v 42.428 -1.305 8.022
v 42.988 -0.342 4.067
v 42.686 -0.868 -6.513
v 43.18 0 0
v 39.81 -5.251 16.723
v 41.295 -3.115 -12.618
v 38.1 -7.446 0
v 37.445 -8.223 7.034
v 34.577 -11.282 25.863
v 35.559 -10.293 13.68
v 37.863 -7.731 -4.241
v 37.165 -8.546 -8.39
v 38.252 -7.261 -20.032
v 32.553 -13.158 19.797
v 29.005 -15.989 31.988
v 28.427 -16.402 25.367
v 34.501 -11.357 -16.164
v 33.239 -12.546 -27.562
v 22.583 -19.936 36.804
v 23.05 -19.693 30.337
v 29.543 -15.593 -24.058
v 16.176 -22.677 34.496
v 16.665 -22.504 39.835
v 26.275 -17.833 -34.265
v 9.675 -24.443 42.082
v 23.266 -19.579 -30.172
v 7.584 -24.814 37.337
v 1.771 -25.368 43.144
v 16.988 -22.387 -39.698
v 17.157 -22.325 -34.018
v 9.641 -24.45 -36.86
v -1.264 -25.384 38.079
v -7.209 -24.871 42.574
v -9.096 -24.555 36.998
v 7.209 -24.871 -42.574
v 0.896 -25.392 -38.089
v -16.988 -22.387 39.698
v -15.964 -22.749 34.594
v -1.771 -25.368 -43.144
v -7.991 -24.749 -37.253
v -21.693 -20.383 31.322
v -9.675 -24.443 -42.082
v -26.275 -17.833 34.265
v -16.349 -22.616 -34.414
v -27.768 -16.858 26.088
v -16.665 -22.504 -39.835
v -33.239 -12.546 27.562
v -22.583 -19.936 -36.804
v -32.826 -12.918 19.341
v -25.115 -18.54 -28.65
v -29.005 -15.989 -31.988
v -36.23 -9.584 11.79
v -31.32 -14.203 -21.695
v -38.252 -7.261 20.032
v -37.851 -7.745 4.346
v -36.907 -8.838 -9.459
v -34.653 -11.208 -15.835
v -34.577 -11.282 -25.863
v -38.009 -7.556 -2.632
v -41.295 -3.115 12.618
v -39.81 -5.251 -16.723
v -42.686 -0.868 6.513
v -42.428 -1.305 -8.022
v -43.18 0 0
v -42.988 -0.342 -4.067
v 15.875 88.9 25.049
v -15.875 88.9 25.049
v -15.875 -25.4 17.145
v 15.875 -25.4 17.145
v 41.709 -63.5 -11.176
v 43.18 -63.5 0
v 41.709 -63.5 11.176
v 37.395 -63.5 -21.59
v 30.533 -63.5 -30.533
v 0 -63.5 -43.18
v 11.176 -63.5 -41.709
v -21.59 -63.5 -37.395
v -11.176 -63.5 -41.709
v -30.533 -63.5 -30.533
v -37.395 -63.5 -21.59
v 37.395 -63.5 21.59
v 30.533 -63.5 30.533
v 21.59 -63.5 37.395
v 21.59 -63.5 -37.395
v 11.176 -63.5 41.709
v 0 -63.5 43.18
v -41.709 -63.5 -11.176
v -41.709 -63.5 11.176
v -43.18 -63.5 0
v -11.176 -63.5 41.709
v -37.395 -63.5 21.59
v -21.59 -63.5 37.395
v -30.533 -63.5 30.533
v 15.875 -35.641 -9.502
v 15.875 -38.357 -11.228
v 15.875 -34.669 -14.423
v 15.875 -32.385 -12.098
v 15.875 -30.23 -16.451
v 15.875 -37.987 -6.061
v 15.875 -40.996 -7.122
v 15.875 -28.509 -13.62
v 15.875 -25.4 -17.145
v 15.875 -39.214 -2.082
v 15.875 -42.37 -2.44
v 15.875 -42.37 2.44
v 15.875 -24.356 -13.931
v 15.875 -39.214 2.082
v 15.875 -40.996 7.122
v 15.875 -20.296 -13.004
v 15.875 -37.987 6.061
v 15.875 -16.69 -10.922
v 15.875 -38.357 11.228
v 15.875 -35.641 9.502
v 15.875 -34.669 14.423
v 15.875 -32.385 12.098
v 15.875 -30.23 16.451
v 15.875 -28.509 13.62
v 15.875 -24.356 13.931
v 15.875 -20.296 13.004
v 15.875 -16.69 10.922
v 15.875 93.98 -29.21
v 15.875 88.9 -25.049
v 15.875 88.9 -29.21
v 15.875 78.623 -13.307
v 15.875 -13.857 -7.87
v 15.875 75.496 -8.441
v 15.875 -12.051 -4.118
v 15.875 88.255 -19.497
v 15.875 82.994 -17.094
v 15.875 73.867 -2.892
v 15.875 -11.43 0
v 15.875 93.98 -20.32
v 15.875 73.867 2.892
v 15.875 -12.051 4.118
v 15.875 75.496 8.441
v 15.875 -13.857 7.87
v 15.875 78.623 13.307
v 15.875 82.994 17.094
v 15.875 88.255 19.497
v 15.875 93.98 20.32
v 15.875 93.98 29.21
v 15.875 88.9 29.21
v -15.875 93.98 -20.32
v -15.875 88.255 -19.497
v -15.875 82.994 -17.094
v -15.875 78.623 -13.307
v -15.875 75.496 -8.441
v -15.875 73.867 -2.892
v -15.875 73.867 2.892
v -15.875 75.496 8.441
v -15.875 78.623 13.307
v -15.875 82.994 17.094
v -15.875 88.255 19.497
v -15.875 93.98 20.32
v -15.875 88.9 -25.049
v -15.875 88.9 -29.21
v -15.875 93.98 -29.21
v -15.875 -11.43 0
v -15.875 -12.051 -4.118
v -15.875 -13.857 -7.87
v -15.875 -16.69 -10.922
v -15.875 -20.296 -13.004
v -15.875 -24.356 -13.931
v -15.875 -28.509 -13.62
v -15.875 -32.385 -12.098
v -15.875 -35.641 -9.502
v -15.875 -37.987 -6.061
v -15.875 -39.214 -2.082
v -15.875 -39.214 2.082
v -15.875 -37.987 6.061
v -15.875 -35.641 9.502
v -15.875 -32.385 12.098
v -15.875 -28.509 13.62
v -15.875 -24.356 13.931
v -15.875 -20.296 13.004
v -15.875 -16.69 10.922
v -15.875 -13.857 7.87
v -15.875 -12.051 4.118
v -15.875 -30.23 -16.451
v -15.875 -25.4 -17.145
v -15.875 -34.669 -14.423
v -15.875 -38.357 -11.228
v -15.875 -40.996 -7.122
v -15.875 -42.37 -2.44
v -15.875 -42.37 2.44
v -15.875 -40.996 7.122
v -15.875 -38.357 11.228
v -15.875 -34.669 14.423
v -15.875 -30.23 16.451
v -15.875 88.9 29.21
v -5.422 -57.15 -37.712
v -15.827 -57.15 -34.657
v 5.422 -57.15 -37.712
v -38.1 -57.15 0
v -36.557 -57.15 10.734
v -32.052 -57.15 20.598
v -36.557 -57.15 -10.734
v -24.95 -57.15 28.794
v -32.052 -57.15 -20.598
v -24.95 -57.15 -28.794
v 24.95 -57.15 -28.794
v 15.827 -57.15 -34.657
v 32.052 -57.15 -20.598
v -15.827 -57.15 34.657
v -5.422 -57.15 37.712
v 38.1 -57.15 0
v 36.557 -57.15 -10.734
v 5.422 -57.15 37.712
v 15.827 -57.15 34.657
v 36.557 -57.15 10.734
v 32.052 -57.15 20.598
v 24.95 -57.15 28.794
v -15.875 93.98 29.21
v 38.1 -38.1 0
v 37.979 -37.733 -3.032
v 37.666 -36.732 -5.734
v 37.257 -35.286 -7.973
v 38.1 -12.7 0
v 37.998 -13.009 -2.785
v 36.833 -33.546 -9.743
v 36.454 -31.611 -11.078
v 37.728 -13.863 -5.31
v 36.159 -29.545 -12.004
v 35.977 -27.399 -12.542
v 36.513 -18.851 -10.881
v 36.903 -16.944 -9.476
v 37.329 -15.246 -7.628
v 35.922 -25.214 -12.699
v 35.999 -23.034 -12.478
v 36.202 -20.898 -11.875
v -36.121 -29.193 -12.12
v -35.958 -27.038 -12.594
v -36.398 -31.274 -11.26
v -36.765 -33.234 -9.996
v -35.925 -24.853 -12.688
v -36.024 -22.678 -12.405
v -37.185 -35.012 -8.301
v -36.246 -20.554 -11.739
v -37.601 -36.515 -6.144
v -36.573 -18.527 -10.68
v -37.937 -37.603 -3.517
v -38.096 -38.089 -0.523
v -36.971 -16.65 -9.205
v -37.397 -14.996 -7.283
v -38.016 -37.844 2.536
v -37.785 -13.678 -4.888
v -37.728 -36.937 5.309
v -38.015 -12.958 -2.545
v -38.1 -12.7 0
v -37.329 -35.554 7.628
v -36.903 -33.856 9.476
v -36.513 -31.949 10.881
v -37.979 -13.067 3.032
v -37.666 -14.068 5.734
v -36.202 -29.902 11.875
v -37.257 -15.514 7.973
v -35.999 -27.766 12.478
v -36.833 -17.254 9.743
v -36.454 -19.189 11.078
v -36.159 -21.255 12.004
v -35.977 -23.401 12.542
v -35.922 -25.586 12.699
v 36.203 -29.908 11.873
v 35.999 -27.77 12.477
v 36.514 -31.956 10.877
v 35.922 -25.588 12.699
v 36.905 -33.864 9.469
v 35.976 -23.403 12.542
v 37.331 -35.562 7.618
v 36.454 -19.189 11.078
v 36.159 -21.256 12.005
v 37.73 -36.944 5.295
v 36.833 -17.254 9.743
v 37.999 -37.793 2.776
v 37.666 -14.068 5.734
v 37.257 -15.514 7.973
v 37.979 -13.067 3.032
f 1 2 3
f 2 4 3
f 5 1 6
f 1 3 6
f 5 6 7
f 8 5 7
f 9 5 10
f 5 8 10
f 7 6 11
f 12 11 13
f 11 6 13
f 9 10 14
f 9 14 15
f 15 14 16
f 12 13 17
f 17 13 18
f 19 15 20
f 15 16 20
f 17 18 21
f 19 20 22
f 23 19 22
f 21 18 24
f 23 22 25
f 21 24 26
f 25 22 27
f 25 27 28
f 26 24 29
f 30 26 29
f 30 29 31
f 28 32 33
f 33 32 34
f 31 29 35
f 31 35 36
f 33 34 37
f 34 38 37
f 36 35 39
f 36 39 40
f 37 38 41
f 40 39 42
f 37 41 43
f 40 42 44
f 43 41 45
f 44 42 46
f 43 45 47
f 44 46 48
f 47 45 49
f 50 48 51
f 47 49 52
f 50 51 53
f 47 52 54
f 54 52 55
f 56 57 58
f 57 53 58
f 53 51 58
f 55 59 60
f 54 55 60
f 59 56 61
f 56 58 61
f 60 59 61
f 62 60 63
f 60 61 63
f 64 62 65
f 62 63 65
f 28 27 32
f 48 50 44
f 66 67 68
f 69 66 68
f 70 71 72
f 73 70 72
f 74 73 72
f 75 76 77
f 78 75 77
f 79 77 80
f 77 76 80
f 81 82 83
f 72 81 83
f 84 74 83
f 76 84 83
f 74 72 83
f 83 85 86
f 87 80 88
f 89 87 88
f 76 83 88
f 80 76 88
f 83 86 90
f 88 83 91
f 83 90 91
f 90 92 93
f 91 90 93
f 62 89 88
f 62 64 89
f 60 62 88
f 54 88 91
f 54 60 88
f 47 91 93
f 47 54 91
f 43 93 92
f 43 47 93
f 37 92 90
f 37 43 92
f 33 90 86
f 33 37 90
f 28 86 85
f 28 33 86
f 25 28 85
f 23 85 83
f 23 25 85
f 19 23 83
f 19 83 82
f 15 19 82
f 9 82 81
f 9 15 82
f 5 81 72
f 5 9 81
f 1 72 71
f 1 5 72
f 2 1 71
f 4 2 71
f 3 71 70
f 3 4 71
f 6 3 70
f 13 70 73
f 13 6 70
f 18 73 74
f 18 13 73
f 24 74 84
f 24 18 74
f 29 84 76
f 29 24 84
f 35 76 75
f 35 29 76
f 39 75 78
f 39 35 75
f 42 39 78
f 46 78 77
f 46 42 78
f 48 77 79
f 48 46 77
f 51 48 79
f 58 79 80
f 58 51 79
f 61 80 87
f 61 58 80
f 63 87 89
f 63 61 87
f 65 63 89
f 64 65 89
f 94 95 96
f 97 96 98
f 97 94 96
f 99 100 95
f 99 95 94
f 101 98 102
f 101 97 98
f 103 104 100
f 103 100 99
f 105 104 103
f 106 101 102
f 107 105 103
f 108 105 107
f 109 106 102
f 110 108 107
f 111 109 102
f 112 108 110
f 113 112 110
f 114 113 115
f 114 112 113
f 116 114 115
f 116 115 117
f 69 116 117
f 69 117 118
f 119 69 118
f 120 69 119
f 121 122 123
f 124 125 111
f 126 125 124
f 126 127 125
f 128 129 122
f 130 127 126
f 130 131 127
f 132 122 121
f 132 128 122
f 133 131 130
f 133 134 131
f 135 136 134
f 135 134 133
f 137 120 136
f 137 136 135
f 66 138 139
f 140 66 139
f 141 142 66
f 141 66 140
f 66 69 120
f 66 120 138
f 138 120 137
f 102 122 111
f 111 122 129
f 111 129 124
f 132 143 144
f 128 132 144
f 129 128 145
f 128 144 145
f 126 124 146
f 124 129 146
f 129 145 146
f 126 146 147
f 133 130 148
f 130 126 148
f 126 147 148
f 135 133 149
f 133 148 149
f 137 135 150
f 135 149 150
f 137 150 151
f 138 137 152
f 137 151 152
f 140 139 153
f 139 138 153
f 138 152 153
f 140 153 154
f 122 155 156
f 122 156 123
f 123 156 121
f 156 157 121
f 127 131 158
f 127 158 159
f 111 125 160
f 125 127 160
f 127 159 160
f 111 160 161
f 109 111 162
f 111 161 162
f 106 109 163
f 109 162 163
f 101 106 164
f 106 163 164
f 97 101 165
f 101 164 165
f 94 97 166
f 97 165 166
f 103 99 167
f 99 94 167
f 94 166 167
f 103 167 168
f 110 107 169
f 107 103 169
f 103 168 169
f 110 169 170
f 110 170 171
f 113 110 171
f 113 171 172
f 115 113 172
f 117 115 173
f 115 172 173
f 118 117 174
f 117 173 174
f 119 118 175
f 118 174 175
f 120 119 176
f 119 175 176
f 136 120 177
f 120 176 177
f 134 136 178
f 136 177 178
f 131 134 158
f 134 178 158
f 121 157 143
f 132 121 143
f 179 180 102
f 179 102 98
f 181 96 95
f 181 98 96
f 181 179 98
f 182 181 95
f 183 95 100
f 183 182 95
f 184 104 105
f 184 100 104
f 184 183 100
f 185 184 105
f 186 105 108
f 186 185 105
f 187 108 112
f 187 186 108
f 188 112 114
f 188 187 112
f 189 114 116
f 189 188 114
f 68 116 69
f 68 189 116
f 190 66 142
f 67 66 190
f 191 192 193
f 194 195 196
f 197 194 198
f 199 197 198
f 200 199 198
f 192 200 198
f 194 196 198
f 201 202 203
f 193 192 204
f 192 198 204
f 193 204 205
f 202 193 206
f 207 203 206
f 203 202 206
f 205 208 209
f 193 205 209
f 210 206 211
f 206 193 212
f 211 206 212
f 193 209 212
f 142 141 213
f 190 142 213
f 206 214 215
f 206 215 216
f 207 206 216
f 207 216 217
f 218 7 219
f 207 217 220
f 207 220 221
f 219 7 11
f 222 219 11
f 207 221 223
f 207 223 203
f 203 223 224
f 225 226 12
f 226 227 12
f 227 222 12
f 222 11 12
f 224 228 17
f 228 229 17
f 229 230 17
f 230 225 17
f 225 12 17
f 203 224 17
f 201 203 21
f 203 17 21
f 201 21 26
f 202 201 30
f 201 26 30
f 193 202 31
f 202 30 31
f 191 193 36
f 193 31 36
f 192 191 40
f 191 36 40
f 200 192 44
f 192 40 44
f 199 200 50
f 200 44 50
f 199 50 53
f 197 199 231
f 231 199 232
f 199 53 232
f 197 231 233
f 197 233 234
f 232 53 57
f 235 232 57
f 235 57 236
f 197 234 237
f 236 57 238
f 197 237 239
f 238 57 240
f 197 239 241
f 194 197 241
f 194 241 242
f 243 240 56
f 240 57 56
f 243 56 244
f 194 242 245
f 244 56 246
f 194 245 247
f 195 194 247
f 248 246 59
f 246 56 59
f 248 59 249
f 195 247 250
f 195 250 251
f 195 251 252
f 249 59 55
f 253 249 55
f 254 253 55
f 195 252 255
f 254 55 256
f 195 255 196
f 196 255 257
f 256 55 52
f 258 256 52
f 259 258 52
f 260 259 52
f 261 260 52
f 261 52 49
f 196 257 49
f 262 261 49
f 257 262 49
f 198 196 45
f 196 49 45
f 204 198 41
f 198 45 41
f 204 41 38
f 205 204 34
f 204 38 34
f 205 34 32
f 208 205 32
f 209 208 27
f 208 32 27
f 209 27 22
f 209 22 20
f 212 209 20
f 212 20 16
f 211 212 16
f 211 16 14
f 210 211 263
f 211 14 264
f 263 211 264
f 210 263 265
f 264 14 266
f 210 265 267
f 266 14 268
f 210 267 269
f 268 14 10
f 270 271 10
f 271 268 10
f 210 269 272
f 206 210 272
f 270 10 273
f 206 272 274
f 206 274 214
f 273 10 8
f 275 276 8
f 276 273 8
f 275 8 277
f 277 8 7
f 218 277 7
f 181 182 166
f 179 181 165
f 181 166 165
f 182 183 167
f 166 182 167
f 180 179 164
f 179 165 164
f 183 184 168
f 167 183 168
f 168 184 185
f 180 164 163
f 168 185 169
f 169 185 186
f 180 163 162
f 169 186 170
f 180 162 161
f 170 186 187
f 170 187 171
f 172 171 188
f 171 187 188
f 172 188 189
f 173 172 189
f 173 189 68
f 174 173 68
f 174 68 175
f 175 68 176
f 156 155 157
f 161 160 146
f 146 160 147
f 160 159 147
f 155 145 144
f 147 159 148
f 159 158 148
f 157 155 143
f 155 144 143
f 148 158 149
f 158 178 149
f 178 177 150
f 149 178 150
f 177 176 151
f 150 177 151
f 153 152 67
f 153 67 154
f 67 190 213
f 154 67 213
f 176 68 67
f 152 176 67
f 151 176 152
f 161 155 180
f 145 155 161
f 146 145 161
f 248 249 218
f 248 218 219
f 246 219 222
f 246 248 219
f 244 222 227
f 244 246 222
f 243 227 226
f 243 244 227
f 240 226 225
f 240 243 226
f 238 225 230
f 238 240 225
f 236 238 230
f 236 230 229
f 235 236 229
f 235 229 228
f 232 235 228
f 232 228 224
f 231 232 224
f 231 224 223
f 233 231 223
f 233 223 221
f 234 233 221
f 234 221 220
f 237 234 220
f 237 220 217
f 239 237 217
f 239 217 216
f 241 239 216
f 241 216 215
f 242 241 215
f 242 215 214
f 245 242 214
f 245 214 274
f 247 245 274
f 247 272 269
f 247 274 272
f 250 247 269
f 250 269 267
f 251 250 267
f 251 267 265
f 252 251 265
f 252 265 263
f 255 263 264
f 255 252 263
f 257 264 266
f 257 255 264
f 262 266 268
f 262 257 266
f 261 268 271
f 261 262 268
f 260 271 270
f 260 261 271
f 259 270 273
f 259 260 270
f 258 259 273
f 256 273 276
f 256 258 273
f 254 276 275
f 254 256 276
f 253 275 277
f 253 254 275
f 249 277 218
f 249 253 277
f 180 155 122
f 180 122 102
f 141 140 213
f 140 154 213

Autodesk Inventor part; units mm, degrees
ref_plane "YZ Plane" through (0, 0, 0) normal (1, 0, 0) x (0, 1, 0)
sketch "Sketch1" plane through (0, 0, 0) normal (0, 1, 0) x (-1, 0, 0)
  circle A0 centre (0, 0) radius 43.18
  dimension "d0" = 86.36
extrude "Extrusion1" add sketch "Sketch1" against normal blind 63.5
sketch "Sketch2" plane through (0, 0, 0) normal (0, 0, 1) x (1, 0, 0)
  line L0 (-43.18, 0) -> (43.18, 0) projected
  arc A0 (-43.18, 0) -> (43.18, 0) centre (0, 24.003) ccw
  line L1 (-43.18, -63.5) -> (43.18, -63.5) projected
  point P0 (0, 0)
  dimension "d4" = 38.1
extrude "Extrusion2" cut sketch "Sketch2" along normal mid plane 101.6
ref_plane "Work Plane1" through (0, 0, 0) normal (0, -1, 0) x (1, 0, 0)
sketch "Sketch3" plane through (0, 0, 0) normal (0, -1, 0) x (1, 0, 0)
  circle A0 centre (0, 0) radius 38.1
  dimension "d8" = 76.2
extrude "Extrusion3" cut sketch "Sketch3" along normal blind 57.15
sketch "Sketch4" plane through (0, 0, 0) normal (1, 0, 0) x (0, 1, 0)
  circle A0 centre (-25.4, 0) radius 12.7
  point P0 (0, 0)
  dimension "d11" = 25.4
  dimension "d12" = 25.4
  dimension "d13" = 0
extrude "Extrusion4" add sketch "Sketch4" along normal mid plane 78.74
sketch "Sketch5" plane through (0, 0, 0) normal (1, 0, 0) x (0, 1, 0)
  circle A0 centre (-25.4, 0) radius 13.97
  arc A1 (-25.4, 17.145) -> (-25.4, -17.145) centre (-25.4, 0) ccw
  line L0 (-63.5, 43.18) -> (-63.5, -43.18) projected
  circle A2 centre (93.98, 0) radius 20.32
  arc A3 (90.484, -25.1583) -> (93.98, 25.4) centre (93.98, 0) ccw
  line L1 (93.98, 25.4) -> (-25.4, 17.145)
  line L2 (90.484, -25.1583) -> (-25.4, -17.145)
  point P0 (0, 0)
  point P1 (-25.4, 12.7)
  dimension "d16" = 27.94
  dimension "d17" = 34.29
  dimension "d18" = 38.1
  dimension "d19" = 43.18
  dimension "d20" = 40.64
  dimension "d21" = 0
  dimension "d22" = 119.38
  dimension "d23" = 50.8
extrude "Extrusion5" add sketch "Sketch5" along normal mid plane 31.75
sketch "Sketch6" plane through (0, 0, 0) normal (1, 0, 0) x (0, 1, 0)
  circle A0 centre (93.98, 0) radius 20.32 construction
  line L0 (93.98, 0) -> (93.98, -43.5701)
  line L1 (93.98, 0) -> (93.98, 40.9183)
  line L2 (93.98, 40.9183) -> (142.8926, 40.9183)
  line L3 (142.8926, 40.9183) -> (133.2711, -47.8298)
  line L4 (133.2711, -47.8298) -> (93.98, -43.5701)
  point P0 (0, 0)
extrude "Extrusion6" cut sketch "Sketch6" along normal mid plane 2540
ref_plane "Work Plane2" through (0, 0, -22.86) normal (0, 0, 1) x (1, 0, 0)
sketch "Sketch7" plane through (0, 0, -22.86) normal (0, 0, 1) x (1, 0, 0)
  line L0 (15.875, 90.484) -> (15.875, 93.98) projected
  line L1 (-15.875, -25.4) -> (-15.875, 93.98) construction
  line L2 (15.875, 93.98) -> (-15.875, 93.98)
  line L3 (-15.875, 93.98) -> (-15.875, 88.9)
  line L4 (-15.875, 88.9) -> (15.875, 88.9)
  line L5 (15.875, 88.9) -> (15.875, 93.98)
  point P0 (0, 0)
  dimension "d29" = 5.08
extrude "Extrusion7" add sketch "Sketch7" against normal blind 6.35
mirror "Mirror1" about plane through (0, 0, 0) normal (0, 0, 1) of "Extrusion7"
properties part number "Pistons"
